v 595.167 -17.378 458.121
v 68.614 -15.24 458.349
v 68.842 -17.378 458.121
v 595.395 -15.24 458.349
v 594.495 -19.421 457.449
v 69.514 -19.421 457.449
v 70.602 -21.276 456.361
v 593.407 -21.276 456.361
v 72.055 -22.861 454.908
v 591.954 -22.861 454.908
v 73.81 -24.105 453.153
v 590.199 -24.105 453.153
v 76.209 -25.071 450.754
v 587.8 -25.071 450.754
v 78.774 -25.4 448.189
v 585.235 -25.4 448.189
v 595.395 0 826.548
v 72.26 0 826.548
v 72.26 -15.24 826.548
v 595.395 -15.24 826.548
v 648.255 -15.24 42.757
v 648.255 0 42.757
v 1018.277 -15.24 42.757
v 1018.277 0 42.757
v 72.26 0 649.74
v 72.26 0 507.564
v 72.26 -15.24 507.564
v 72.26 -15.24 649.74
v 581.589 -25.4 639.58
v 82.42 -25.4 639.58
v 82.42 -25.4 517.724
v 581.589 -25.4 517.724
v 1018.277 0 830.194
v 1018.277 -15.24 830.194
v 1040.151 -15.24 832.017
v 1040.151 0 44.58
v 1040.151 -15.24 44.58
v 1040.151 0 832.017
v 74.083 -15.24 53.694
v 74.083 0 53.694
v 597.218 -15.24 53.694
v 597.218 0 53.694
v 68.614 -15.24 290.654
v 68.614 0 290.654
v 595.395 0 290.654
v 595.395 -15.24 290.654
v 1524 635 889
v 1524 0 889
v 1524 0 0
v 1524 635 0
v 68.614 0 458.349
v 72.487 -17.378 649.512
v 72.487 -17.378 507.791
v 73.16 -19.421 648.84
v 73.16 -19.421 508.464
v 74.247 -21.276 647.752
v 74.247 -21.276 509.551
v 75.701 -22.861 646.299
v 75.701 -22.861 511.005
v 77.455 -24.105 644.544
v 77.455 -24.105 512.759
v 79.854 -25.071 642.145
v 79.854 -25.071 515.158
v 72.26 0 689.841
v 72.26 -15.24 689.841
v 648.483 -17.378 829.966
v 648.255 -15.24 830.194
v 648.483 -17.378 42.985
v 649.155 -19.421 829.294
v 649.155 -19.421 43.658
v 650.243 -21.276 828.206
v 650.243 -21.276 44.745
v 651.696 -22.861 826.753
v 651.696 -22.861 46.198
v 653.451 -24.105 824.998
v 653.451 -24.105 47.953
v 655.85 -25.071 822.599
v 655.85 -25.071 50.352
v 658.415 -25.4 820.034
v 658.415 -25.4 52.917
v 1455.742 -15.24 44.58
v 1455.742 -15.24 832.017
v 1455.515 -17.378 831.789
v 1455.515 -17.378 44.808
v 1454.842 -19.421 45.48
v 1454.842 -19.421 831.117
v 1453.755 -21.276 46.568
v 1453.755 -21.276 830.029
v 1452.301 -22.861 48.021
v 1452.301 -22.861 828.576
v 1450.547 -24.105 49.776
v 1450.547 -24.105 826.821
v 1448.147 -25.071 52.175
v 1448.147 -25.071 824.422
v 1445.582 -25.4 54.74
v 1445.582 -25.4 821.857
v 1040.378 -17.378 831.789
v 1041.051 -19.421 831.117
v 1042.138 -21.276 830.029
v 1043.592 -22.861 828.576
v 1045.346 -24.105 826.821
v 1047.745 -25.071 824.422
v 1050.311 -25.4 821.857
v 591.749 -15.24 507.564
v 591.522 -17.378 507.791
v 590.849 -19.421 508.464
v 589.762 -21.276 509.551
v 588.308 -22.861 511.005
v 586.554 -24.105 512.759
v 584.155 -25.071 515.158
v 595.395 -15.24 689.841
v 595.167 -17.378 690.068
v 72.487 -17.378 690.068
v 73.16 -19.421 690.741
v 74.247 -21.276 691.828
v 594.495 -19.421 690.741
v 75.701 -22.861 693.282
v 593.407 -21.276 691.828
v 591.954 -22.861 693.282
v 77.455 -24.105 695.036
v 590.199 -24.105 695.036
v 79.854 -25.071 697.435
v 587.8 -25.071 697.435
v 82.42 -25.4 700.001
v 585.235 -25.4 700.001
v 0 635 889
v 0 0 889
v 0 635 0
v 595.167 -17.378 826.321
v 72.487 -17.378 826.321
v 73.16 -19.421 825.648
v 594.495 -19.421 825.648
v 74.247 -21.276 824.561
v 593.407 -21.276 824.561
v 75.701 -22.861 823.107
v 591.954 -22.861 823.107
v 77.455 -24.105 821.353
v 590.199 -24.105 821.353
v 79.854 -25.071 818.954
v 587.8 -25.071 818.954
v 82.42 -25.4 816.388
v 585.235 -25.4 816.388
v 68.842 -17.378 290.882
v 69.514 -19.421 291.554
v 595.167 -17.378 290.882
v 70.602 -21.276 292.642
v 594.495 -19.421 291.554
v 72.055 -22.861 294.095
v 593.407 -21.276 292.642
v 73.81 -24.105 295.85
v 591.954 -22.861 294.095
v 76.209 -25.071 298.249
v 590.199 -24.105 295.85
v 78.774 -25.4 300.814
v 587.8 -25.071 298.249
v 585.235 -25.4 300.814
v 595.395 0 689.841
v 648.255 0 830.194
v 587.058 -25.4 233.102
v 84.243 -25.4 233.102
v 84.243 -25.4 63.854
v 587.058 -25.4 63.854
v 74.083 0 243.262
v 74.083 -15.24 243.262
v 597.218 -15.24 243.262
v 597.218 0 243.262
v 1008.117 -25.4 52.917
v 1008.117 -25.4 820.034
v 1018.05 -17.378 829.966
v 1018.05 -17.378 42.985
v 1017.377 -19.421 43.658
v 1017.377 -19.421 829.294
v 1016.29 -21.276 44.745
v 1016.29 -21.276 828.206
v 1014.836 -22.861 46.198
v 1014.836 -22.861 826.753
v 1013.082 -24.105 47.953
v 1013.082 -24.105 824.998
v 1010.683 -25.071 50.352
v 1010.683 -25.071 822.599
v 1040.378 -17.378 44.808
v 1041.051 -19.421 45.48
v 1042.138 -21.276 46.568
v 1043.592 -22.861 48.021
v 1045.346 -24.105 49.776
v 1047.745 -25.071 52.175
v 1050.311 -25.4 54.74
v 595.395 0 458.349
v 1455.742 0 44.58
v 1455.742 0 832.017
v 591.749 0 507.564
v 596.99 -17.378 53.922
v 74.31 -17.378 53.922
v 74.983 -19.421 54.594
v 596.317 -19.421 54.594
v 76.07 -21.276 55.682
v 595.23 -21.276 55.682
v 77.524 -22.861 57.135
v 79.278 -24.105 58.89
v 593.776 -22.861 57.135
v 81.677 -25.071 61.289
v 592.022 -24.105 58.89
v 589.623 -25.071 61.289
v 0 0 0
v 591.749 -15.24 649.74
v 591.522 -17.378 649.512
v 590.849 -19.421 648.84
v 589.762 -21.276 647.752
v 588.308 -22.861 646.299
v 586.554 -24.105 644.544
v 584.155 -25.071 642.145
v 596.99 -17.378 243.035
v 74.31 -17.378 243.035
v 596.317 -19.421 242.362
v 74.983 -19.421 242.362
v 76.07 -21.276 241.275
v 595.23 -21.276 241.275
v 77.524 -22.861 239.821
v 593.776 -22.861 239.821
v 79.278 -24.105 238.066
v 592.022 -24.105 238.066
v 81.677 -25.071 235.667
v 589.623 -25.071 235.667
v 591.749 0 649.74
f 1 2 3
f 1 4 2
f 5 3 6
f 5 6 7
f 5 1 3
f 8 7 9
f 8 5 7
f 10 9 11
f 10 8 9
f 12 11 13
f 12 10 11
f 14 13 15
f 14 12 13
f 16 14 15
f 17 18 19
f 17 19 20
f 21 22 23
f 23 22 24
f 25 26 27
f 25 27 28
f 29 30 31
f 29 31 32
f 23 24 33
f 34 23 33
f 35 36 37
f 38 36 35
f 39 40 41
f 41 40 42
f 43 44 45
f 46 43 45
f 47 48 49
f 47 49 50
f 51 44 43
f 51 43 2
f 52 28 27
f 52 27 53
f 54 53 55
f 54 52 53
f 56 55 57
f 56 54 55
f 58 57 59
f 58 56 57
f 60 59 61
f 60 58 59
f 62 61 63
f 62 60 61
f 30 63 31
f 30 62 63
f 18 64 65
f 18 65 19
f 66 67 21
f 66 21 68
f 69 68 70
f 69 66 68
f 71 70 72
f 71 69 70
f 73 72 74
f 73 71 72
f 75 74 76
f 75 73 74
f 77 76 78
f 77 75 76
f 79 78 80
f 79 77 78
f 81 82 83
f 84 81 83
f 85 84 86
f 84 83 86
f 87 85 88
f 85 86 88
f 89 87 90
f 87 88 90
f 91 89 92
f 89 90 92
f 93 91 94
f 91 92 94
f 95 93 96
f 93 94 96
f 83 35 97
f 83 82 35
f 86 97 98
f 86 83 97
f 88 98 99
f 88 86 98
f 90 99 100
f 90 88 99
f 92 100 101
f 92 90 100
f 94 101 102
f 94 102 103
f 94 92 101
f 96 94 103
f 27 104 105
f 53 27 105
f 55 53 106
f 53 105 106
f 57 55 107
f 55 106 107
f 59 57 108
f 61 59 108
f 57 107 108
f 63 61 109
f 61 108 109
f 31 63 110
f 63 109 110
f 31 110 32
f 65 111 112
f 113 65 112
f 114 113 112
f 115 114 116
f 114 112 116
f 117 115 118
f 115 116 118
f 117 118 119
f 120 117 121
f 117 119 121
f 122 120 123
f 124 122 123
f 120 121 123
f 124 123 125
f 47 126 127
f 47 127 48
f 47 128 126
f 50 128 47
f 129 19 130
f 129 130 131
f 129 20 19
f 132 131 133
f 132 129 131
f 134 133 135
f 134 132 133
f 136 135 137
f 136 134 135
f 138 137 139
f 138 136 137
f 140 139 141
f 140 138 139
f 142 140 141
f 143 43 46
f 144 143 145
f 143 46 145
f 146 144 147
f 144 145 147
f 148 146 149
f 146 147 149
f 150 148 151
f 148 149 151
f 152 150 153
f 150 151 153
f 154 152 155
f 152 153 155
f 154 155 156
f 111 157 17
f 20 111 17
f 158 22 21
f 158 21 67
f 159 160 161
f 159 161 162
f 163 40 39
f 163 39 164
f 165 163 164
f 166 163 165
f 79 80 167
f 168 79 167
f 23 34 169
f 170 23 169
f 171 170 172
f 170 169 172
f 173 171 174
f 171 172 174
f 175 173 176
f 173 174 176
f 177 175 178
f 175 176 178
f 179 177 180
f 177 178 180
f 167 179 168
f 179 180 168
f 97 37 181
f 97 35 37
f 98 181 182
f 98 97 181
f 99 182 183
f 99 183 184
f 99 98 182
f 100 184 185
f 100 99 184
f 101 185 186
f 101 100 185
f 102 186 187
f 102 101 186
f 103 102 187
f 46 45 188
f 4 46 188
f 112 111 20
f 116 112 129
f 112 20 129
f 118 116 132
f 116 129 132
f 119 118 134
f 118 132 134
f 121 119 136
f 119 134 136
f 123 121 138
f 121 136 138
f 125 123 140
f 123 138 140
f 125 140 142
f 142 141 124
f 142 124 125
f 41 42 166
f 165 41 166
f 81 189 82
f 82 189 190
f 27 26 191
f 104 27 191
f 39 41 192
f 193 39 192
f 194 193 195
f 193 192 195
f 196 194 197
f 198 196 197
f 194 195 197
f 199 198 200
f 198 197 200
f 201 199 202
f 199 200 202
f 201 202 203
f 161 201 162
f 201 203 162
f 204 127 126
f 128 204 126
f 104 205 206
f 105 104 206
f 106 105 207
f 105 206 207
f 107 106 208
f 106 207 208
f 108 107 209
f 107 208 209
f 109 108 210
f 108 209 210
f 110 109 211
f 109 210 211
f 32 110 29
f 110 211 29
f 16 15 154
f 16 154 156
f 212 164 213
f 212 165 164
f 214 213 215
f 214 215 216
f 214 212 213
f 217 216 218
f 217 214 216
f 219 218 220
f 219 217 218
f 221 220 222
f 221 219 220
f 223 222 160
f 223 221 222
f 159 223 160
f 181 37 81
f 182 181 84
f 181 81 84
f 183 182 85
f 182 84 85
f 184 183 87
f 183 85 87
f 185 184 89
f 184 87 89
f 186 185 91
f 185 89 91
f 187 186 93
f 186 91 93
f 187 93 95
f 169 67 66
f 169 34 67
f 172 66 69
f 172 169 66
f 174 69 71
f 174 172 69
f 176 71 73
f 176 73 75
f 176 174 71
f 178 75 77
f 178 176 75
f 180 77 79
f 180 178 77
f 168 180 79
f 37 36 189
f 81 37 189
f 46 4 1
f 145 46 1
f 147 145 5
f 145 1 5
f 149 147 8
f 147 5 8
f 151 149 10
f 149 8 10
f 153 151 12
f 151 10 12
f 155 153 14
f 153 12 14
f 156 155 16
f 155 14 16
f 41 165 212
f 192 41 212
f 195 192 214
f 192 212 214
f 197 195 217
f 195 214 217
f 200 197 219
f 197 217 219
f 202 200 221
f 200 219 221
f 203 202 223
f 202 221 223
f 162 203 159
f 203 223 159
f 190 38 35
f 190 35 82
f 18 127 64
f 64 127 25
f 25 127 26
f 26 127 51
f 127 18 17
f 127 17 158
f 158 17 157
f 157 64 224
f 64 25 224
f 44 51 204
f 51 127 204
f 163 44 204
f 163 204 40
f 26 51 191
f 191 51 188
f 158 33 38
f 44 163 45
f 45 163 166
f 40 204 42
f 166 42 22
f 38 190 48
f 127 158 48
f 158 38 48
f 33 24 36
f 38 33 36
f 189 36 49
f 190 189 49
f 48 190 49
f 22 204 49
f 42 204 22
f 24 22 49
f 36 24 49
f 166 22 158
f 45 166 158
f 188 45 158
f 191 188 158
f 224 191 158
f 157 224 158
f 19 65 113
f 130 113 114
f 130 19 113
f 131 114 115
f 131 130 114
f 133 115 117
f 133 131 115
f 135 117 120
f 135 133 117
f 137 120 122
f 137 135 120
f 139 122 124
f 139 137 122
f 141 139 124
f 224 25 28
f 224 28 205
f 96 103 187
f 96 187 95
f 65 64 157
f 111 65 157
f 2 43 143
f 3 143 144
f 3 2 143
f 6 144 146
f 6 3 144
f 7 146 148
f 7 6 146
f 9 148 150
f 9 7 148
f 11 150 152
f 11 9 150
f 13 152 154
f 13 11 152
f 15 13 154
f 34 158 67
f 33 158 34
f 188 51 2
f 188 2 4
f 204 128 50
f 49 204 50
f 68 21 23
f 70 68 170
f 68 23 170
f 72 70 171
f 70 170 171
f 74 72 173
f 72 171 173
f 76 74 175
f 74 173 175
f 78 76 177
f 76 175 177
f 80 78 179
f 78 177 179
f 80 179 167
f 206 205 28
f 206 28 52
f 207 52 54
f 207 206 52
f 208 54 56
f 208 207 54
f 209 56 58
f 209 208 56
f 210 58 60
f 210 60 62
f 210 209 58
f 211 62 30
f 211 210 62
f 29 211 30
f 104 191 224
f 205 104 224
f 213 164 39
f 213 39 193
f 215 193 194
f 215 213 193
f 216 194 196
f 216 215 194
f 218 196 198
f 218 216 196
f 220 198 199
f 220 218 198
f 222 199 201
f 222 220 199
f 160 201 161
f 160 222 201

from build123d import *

# Parameters (mm, degrees)
F0_W     = 1524
F0_H     = 635
F1_DEPTH = 889
F2_W     = 415.591598
F2_H     = 787.436507
F2_W_2   = 370.022237
F2_H_2   = 787.436578
F2_W_3   = 523.134932
F2_H_3   = 136.707724
F2_W_4   = 519.489392
F2_H_4   = 142.176032
F2_W_5   = 526.780472
F2_H_5   = 167.694807
F2_H_6   = 189.568065
F3_DEPTH = 25.4
F4_R     = 10.16


with BuildPart() as f1:
    # F0 (on Top) → F1 (new body)
    with BuildSketch(Plane.XY):
        with Locations((762, 317.5)):
            Rectangle(F0_W, F0_H)
    extrude(amount=F1_DEPTH)

    # F2 (on face) → F3 (join)
    with BuildSketch(Plane.XZ):
        with Locations((1247.946322, 438.298452)):
            Rectangle(F2_W, F2_H)
        with Locations((833.266169, 436.475707)):
            Rectangle(F2_W_2, F2_H_2)
        with Locations((333.827265, 758.194536)):
            Rectangle(F2_W_3, F2_H_3)
        with Locations((332.004495, 578.651726)):
            Rectangle(F2_W_4, F2_H_4)
        with Locations((332.004495, 374.501526)):
            Rectangle(F2_W_5, F2_H_5)
        with Locations((335.650034, 148.478064)):
            Rectangle(F2_W_3, F2_H_6)
    extrude(amount=F3_DEPTH)

    # F4
    f4_edges = [f1.edges().sort_by_distance(p)[0] for p in [
        (595.394731, -25.4, 758.194536),
        (333.827265, -25.4, 826.548398),
        (72.259799, -25.4, 758.194536),
        (333.827265, -25.4, 689.840674),
        (833.266169, -25.4, 42.757418),
        (1018.277287, -25.4, 436.475707),
        (833.266169, -25.4, 830.193996),
        (648.25505, -25.4, 436.475707),
        (1455.742121, -25.4, 438.298453),
        (1247.946322, -25.4, 832.016706),
        (1040.150523, -25.4, 438.298453),
        (1247.946322, -25.4, 44.580199),
        (591.749191, -25.4, 578.651726),
        (332.004495, -25.4, 649.739742),
        (72.259799, -25.4, 578.651726),
        (332.004495, -25.4, 507.56371),
        (595.394731, -25.4, 374.501526),
        (332.004495, -25.4, 458.34893),
        (68.614259, -25.4, 374.501526),
        (332.004495, -25.4, 290.654123),
        (597.2175, -25.4, 148.478065),
        (335.650034, -25.4, 243.262097),
        (74.082568, -25.4, 148.478065),
        (335.650034, -25.4, 53.694032),
    ]]
    fillet(f4_edges, radius=F4_R)


solid = f1.part
